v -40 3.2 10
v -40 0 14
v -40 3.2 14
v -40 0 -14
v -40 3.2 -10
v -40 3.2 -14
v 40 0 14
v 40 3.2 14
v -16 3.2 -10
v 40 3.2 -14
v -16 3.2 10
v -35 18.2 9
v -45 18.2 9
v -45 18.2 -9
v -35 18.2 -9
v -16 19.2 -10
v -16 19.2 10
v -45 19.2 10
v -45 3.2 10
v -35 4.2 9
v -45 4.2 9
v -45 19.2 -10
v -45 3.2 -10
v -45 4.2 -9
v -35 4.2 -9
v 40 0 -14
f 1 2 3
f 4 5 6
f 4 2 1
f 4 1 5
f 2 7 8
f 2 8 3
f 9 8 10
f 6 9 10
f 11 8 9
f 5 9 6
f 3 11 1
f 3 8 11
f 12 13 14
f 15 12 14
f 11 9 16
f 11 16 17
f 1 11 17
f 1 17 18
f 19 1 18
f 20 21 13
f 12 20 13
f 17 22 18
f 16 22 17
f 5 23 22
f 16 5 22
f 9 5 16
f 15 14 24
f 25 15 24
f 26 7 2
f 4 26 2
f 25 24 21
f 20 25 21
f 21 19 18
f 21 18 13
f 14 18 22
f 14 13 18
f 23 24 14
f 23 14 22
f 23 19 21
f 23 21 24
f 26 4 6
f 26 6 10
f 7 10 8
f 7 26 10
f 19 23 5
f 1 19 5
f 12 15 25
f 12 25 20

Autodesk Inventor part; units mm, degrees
ref_plane "YZ Plane" through (0, 0, 0) normal (1, 0, 0) x (0, 1, 0)
ref_plane "XZ Plane" through (0, 0, 0) normal (0, 1, 0) x (-1, 0, 0)
ref_plane "XY Plane" through (0, 0, 0) normal (0, 0, 1) x (1, 0, 0)
sketch "Boceto1" plane through (0, 0, 0) normal (0, 1, 0) x (-1, 0, 0)
  line L0 (-40, 14) -> (40, 14)
  line L1 (40, 14) -> (40, -14)
  line L2 (40, -14) -> (-40, -14)
  line L3 (-40, -14) -> (-40, 14)
  line L4 (-40, 14) -> (40, -14) construction
  line L5 (40, 14) -> (-40, -14) construction
  point P0 (0, 0)
  dimension "d0" = 80
  dimension "d1" = 28
extrude "Extrusión1" add sketch "Boceto1" along normal blind 3.2
sketch "Boceto2" plane through (0, 3.2, 0) normal (0, 1, 0) x (1, 0, 0)
  line L0 (-45, 10) -> (-16, 10)
  line L1 (-16, 10) -> (-16, -10)
  line L2 (-16, -10) -> (-45, -10)
  line L3 (-45, -10) -> (-45, 10)
  line L4 (-45, 10) -> (-16, -10) construction
  line L5 (-16, 10) -> (-45, -10) construction
  line L6 (-40, 14) -> (-40, -14) projected
  point P0 (0, 0)
  point P1 (-30.5, 0)
  dimension "d4" = 20
  dimension "d5" = 29
  dimension "d6" = 5
extrude "Extrusión2" add sketch "Boceto2" along normal blind 16
sketch "Boceto3" plane through (-45, 3.2, -10) normal (-1, 0, 0) x (0, 0, 1)
  line L0 (-4, 0) -> (0, 0) projected
  line L1 (20, 0) -> (20, 16) projected
  line L2 (1, 1) -> (19, 1)
  line L3 (19, 1) -> (19, 15)
  line L4 (19, 15) -> (1, 15)
  line L5 (1, 15) -> (1, 1)
  line L6 (1, 1) -> (19, 15) construction
  line L7 (19, 1) -> (1, 15) construction
  point P0 (10, -3.2)
  point P1 (0, 16)
  point P2 (10, 8)
  dimension "d9" = 18
  dimension "d10" = 14
extrude "Extrusión3" cut sketch "Boceto3" against normal blind 10
properties part number "ESP32_PoE"
